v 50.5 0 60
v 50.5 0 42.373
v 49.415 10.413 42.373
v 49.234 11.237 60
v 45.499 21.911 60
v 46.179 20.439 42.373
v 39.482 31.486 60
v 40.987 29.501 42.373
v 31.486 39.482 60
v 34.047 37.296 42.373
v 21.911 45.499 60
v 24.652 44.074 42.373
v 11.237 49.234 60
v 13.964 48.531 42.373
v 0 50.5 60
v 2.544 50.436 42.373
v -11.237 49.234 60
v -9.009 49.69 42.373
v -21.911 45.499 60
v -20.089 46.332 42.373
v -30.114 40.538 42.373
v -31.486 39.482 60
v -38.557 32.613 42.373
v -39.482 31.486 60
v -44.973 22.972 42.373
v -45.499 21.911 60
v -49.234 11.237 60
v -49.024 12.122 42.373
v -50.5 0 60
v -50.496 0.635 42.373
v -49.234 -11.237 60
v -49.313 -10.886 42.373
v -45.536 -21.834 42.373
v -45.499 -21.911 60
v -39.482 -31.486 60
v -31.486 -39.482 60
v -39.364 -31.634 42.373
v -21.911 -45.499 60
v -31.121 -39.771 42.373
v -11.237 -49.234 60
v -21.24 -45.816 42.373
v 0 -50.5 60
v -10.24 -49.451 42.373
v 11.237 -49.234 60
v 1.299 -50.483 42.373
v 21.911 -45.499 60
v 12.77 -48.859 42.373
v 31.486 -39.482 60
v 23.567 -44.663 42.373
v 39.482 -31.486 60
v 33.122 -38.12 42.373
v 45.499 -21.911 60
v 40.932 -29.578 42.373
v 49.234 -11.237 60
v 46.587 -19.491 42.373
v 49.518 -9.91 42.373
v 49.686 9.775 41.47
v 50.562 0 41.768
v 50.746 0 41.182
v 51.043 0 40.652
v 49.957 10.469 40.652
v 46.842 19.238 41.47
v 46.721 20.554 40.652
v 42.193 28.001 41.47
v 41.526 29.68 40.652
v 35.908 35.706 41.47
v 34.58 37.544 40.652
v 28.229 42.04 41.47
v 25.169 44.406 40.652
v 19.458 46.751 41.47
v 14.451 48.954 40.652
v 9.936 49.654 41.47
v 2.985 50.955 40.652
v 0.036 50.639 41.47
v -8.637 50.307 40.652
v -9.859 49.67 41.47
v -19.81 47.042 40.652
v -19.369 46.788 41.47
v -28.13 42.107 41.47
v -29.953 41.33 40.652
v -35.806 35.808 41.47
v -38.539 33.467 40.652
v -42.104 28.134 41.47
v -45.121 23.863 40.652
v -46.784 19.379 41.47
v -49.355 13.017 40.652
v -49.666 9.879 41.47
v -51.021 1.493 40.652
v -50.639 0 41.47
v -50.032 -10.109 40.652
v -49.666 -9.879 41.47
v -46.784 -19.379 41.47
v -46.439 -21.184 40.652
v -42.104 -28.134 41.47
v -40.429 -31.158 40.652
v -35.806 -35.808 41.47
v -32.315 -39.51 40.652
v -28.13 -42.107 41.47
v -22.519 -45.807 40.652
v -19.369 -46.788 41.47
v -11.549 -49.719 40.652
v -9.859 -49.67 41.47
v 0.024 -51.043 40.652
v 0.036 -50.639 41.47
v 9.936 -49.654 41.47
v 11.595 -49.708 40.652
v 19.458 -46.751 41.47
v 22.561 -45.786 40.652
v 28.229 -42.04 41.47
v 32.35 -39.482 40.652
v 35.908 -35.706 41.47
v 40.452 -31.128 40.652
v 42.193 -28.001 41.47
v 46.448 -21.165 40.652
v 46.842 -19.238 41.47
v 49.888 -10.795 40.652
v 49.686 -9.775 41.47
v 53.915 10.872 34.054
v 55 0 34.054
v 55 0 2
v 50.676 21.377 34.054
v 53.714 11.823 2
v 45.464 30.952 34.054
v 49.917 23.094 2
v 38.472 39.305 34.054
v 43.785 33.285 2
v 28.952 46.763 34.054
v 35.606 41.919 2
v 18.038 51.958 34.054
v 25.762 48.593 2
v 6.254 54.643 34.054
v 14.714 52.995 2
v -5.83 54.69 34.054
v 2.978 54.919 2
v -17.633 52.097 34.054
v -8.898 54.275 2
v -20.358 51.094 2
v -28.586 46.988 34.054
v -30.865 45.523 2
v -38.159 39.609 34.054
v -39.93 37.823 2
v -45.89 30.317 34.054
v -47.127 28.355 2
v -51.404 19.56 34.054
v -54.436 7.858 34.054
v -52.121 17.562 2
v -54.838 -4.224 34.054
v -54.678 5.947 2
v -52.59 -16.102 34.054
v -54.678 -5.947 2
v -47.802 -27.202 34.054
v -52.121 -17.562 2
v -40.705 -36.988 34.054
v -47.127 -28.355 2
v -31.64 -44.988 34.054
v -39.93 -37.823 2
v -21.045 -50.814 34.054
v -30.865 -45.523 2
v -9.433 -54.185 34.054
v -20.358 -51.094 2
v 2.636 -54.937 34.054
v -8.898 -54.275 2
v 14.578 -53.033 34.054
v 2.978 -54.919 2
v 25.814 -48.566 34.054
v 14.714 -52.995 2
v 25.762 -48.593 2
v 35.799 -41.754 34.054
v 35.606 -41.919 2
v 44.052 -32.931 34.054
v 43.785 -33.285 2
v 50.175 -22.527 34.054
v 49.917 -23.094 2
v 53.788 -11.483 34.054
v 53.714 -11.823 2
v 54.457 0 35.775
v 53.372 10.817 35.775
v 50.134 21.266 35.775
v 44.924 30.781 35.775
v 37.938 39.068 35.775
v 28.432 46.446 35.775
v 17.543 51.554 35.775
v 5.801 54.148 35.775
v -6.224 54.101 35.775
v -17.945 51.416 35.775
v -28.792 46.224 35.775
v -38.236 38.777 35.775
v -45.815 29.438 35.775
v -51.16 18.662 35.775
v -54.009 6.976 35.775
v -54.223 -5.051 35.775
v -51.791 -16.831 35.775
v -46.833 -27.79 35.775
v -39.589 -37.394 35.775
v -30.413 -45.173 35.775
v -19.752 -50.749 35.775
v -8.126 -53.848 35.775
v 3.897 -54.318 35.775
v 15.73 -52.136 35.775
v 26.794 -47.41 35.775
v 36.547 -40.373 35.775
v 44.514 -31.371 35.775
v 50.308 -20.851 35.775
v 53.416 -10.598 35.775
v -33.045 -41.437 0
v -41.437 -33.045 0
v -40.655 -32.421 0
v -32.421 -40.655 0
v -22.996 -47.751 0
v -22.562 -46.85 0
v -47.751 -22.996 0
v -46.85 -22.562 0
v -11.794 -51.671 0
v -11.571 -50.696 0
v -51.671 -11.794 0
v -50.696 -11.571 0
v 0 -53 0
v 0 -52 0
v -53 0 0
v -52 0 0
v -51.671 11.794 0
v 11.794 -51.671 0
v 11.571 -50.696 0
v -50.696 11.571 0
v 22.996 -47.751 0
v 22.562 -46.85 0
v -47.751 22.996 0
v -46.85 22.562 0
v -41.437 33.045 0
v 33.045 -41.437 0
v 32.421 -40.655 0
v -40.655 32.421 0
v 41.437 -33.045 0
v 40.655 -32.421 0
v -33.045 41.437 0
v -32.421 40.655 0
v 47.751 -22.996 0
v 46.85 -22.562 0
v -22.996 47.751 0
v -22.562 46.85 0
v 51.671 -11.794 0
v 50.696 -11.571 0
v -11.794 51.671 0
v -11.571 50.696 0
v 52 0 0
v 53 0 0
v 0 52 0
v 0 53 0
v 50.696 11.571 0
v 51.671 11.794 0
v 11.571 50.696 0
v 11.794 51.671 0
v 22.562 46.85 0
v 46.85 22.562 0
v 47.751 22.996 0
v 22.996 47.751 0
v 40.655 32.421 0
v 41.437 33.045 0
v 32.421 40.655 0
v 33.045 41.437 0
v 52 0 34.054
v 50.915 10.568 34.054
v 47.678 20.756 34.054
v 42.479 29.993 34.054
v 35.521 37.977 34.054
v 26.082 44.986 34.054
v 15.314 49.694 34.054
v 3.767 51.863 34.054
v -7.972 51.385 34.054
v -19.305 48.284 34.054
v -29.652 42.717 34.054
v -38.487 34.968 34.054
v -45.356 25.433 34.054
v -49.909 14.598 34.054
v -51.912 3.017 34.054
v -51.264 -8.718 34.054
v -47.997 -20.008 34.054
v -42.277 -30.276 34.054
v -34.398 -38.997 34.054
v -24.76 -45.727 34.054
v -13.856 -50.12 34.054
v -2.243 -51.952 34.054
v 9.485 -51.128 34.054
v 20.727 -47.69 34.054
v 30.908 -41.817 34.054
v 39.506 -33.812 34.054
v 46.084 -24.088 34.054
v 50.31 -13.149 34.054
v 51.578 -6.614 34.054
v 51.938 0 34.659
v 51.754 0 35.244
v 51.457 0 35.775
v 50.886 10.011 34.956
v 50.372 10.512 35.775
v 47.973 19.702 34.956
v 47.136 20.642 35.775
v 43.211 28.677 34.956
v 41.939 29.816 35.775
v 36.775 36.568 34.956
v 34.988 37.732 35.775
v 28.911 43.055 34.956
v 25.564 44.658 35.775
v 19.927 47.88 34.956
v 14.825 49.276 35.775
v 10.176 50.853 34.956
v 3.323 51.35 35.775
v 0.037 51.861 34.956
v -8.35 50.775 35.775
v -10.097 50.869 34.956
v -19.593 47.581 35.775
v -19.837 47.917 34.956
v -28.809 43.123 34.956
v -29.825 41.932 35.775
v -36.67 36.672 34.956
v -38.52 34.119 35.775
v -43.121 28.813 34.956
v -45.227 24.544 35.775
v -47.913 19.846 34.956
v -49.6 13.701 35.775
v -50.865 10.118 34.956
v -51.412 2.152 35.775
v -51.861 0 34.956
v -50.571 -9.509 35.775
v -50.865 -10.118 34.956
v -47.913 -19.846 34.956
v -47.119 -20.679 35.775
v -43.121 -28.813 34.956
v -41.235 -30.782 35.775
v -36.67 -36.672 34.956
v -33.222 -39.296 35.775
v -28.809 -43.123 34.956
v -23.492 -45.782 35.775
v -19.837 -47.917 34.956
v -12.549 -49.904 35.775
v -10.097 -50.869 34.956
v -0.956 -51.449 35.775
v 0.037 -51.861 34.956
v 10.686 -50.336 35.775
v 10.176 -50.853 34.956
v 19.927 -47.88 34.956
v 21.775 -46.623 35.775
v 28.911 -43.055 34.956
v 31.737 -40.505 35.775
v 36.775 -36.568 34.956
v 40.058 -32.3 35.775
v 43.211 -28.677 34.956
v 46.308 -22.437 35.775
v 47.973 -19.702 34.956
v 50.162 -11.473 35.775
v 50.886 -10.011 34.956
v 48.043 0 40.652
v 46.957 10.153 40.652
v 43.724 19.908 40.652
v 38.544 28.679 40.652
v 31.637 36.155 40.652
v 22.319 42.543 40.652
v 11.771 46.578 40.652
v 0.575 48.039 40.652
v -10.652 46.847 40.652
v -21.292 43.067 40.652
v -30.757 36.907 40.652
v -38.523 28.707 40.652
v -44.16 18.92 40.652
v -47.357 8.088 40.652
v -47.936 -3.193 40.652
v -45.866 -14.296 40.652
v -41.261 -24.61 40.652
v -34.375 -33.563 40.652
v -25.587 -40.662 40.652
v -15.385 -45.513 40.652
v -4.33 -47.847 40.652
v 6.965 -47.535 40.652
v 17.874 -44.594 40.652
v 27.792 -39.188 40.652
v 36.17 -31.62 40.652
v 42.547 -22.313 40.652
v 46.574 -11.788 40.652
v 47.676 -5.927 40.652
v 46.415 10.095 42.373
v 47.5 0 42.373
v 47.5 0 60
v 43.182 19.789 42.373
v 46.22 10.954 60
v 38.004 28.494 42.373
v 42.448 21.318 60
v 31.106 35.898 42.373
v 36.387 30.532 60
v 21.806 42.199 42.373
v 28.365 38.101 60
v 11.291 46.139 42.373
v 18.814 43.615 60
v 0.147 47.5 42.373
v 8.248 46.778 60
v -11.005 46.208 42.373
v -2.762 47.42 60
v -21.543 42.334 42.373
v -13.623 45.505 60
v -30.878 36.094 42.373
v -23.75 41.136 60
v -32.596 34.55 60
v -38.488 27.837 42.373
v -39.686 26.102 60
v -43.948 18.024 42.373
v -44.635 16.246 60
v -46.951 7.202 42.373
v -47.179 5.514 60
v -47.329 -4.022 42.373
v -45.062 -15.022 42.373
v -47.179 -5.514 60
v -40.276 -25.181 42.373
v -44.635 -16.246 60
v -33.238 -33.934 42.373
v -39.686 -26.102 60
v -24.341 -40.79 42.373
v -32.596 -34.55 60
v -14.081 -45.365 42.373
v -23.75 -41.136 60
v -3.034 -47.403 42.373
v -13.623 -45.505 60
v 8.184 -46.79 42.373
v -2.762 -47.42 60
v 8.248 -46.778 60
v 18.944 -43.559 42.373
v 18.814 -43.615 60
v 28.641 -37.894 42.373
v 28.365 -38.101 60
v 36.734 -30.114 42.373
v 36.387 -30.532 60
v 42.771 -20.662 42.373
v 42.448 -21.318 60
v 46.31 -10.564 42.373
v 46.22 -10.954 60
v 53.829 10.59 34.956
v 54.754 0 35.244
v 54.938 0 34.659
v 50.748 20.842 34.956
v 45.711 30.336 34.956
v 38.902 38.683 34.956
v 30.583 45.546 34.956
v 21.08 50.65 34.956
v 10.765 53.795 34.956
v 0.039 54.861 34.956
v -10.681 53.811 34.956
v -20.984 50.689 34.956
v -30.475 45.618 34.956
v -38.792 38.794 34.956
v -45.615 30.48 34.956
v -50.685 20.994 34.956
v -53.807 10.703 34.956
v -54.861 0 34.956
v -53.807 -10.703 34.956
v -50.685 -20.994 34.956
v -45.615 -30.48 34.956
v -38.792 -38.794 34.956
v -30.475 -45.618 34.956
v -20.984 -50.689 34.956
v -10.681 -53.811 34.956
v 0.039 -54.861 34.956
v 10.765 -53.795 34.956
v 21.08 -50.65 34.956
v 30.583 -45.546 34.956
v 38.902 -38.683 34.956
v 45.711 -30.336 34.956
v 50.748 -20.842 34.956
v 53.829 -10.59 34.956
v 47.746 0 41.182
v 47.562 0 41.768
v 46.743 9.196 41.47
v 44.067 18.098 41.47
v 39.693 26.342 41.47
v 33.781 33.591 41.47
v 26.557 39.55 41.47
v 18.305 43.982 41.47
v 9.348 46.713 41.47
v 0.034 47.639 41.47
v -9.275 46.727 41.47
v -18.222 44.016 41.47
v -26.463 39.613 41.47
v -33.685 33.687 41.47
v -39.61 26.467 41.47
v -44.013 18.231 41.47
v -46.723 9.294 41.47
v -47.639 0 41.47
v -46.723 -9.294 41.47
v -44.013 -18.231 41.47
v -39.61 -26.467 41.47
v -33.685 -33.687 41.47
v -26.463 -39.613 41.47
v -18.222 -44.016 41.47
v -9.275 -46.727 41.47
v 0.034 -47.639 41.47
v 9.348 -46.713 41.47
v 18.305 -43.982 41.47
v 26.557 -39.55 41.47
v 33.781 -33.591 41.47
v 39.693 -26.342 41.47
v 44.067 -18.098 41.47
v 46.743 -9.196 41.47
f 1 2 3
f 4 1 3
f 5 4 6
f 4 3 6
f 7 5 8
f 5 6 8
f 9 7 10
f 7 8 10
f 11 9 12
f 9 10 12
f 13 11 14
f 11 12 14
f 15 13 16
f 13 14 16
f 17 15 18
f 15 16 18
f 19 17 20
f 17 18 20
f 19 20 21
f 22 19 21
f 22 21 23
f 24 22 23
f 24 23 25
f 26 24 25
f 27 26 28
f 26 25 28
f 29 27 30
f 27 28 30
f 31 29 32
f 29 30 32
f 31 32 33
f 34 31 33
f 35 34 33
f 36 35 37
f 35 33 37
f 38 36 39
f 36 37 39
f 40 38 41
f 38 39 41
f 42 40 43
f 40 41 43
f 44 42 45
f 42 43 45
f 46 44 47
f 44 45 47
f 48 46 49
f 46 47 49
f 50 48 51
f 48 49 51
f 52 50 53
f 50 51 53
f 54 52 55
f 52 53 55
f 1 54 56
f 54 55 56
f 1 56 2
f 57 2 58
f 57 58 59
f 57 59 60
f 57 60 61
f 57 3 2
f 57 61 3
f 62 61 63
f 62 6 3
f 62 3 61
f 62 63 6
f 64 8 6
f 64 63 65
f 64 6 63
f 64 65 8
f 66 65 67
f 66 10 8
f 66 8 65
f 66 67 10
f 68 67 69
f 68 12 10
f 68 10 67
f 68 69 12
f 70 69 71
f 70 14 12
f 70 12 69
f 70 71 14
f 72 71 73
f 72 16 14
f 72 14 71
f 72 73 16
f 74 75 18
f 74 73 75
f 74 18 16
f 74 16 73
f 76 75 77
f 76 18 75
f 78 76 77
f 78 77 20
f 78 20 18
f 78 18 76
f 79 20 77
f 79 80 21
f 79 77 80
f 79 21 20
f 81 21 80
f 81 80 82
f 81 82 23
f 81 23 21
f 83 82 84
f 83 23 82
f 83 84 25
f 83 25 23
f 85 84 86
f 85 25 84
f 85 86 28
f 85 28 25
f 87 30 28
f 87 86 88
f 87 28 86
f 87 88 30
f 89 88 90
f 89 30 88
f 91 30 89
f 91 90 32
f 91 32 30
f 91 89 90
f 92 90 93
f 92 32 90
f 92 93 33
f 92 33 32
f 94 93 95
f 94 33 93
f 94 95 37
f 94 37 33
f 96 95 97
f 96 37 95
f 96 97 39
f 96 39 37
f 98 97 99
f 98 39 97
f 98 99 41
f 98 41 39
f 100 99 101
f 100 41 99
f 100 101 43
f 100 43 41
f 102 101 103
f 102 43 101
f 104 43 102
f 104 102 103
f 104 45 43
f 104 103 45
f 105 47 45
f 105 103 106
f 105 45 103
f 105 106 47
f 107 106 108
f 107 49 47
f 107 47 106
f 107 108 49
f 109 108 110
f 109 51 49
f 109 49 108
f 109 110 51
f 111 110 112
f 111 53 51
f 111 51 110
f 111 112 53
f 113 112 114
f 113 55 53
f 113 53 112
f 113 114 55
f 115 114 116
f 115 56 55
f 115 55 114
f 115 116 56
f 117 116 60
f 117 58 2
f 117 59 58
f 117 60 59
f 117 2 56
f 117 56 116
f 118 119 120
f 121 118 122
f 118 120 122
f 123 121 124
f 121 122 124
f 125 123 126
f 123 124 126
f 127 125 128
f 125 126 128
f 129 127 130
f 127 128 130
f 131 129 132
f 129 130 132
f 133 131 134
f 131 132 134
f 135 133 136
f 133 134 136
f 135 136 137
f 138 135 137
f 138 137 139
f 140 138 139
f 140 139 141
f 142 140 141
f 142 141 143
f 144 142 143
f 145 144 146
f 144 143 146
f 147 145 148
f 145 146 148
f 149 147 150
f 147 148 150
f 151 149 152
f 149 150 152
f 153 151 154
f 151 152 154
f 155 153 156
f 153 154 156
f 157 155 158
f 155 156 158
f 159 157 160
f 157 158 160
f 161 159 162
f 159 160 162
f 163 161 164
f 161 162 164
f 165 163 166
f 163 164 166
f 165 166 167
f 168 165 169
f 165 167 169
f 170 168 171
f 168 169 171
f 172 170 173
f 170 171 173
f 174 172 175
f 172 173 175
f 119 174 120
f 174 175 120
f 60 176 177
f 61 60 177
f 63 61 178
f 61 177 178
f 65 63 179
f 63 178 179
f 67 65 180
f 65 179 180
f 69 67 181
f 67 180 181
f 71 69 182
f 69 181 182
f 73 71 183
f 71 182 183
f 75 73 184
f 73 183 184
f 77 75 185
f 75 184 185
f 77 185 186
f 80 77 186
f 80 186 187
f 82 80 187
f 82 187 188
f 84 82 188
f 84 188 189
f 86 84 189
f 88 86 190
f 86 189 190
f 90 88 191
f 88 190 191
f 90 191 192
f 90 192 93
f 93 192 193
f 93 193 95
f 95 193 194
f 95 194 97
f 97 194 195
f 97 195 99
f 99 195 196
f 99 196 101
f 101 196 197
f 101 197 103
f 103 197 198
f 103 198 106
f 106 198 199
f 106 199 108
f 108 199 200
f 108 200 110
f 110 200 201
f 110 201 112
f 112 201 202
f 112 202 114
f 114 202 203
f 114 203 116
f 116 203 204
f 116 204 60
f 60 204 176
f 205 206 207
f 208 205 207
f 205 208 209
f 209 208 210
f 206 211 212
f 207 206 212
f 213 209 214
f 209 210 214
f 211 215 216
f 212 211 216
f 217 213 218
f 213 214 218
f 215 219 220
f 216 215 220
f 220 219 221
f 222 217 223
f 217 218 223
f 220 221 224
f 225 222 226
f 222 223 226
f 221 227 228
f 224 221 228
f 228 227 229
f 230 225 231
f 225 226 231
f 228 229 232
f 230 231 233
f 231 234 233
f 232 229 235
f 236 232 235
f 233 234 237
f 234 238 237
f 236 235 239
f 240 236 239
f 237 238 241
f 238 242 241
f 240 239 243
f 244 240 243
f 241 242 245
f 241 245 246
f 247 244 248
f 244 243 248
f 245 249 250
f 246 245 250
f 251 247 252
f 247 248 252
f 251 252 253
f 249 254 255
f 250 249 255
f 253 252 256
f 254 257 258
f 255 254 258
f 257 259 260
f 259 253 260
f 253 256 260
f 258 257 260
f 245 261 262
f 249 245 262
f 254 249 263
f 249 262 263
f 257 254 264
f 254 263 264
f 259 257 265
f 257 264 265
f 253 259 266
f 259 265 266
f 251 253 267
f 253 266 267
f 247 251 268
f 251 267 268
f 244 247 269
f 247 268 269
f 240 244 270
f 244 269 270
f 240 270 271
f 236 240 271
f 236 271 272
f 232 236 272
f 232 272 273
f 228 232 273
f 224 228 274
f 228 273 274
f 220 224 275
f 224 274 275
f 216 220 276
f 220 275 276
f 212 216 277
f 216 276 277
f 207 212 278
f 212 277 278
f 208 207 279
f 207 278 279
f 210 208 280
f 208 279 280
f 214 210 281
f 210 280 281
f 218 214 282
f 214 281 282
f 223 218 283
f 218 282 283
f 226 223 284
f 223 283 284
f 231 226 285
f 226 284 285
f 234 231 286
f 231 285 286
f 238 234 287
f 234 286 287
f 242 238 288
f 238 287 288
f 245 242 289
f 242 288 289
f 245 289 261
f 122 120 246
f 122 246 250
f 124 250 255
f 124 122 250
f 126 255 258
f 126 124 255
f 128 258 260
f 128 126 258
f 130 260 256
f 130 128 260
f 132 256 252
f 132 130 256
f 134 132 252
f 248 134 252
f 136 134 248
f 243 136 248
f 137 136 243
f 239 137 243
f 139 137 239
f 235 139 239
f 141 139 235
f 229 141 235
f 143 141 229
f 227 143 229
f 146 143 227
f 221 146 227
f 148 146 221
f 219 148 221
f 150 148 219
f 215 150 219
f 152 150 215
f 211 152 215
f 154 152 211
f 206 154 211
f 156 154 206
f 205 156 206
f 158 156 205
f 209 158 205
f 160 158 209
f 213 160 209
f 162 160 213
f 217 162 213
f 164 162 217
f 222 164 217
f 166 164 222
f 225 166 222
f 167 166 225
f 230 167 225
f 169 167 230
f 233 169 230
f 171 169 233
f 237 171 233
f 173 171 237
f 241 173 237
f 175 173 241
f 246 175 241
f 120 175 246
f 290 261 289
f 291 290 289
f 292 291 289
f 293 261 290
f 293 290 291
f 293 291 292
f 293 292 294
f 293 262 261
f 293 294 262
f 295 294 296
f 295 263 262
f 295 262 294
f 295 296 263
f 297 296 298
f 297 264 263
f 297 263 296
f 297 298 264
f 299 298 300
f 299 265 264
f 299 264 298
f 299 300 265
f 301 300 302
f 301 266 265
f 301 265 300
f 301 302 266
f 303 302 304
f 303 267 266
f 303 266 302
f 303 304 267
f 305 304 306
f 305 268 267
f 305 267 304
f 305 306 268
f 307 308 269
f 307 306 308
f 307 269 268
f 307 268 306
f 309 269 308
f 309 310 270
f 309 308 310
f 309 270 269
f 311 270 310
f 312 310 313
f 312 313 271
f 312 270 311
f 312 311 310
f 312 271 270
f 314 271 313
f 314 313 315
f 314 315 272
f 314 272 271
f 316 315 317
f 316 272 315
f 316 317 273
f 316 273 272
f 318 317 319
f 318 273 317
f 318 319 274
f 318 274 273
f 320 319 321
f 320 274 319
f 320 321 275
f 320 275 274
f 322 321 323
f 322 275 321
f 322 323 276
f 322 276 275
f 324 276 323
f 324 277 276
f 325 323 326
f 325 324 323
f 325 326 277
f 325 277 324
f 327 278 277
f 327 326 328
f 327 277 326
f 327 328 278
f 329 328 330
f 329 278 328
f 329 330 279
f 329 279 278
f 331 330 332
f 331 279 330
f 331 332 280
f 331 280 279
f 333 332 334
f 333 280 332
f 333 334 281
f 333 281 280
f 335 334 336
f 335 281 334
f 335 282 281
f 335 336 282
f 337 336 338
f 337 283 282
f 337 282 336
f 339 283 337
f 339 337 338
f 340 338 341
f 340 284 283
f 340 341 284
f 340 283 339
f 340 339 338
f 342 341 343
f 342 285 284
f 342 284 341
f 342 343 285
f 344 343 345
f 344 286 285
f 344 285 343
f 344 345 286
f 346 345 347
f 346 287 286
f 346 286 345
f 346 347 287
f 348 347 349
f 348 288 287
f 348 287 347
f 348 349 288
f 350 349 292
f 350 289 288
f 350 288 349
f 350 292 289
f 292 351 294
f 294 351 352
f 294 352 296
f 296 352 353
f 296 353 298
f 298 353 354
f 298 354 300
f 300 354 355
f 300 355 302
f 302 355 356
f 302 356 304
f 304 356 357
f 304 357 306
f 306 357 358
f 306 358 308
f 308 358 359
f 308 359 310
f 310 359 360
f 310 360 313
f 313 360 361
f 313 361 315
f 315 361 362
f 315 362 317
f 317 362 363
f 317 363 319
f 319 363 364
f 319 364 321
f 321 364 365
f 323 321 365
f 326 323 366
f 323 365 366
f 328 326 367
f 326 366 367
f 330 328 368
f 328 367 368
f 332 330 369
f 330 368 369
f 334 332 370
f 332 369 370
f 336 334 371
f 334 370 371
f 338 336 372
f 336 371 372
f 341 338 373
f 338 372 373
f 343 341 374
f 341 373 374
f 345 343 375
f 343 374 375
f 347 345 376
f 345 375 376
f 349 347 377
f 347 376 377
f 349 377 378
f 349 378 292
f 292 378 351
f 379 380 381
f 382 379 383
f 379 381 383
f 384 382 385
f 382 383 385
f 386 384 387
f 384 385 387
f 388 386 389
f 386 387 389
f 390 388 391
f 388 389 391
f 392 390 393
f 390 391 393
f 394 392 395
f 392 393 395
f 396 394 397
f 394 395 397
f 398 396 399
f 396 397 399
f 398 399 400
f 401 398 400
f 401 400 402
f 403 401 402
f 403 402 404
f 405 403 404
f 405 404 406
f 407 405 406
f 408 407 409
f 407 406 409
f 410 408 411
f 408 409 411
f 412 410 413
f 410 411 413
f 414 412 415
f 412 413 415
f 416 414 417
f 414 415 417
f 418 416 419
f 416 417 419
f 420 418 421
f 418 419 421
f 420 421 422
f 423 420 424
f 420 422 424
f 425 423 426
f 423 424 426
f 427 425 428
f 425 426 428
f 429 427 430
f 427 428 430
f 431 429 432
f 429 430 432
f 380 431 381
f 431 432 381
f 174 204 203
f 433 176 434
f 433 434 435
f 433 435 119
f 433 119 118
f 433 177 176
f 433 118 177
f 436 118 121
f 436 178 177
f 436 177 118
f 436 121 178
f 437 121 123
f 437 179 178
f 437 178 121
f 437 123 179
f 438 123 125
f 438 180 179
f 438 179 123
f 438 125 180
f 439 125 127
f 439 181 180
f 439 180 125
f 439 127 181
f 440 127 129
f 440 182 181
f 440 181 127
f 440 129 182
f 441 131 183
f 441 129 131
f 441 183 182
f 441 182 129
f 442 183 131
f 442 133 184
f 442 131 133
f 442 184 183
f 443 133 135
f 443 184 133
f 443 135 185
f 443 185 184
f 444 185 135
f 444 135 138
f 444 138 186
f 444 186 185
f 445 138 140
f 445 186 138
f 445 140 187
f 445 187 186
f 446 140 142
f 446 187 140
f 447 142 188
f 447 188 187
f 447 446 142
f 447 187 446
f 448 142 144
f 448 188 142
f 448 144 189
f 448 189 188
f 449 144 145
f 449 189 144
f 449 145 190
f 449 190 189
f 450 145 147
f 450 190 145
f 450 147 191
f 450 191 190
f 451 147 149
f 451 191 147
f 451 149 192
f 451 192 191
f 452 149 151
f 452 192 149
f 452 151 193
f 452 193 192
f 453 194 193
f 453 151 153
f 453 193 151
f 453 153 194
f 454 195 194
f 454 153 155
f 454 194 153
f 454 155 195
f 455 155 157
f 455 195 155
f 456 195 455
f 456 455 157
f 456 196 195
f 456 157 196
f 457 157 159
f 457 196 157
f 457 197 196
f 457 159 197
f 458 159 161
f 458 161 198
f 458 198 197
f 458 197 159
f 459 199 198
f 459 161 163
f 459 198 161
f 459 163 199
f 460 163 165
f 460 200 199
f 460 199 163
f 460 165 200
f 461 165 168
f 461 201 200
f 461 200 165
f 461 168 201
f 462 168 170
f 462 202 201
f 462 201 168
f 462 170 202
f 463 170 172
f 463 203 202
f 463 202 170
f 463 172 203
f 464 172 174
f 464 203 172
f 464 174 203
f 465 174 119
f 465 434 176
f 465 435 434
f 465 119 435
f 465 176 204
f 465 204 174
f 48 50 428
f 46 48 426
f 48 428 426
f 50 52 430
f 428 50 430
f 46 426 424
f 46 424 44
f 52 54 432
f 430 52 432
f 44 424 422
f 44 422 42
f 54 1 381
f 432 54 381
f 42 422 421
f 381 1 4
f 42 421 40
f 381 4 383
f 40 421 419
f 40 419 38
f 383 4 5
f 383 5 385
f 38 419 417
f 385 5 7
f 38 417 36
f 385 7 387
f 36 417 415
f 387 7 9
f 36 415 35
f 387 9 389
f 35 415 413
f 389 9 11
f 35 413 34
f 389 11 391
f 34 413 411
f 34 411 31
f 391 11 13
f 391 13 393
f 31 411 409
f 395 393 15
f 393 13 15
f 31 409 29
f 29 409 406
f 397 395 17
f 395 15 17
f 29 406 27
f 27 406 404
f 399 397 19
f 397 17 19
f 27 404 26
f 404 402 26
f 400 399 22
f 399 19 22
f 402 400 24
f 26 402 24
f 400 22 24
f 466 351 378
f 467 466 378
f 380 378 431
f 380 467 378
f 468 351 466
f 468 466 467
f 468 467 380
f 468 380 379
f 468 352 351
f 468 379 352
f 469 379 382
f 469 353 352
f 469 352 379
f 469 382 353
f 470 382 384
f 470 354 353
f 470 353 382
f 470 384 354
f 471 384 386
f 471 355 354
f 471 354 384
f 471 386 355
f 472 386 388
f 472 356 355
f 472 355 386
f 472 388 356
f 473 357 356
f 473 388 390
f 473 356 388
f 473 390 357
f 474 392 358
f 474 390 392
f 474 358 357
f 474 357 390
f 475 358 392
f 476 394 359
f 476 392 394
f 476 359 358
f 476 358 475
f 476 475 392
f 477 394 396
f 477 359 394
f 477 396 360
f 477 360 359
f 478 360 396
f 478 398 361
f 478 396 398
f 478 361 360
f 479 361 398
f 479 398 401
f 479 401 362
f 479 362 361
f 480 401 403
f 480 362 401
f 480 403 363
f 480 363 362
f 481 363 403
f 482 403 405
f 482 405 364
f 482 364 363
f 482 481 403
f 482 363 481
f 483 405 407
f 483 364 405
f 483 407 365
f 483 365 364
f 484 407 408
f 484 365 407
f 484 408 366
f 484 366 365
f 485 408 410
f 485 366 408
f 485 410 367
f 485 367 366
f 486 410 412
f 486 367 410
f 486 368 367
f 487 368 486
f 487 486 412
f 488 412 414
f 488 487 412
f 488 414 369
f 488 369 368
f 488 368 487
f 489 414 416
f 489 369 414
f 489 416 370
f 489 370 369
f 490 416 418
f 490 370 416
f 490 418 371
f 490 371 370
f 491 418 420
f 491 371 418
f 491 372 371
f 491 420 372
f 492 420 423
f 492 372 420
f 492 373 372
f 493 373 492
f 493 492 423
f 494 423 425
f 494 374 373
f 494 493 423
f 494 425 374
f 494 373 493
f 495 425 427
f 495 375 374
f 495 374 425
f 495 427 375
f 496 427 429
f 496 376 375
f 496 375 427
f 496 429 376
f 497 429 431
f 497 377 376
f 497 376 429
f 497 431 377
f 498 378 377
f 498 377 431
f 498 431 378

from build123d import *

# Parameters (mm, degrees)
FILLET_R     = 3
CHAMFER_SIZE = 2


with BuildPart() as part:
    # Sketch → Revolution (revolve)
    with BuildSketch(Plane.XZ):
        Polygon((52, 0), (52, 35), (47.5, 41.426666), (47.5, 60), (50.5, 60), (50.5, 41.426666), (55, 35), (55, 0), align=None)
    revolve(axis=Axis((0, 0, 0), (0, 0, 1)))

    # Fillet
    fillet_edges = [part.edges().sort_by_distance(p)[0] for p in [
        (-50.5, 0, 41.426666),
        (-55, 0, 35),
        (52.75, 0, 38.213333),
        (-52, 0, 35),
        (-47.5, 0, 41.426666),
        (49.75, 0, 38.213333),
    ]]
    fillet(fillet_edges, radius=FILLET_R)

    # Chamfer
    chamfer_edges = [part.edges().sort_by_distance(p)[0] for p in [
        (-55, 0, 0),
    ]]
    chamfer(chamfer_edges, length=CHAMFER_SIZE)


solid = part.part
